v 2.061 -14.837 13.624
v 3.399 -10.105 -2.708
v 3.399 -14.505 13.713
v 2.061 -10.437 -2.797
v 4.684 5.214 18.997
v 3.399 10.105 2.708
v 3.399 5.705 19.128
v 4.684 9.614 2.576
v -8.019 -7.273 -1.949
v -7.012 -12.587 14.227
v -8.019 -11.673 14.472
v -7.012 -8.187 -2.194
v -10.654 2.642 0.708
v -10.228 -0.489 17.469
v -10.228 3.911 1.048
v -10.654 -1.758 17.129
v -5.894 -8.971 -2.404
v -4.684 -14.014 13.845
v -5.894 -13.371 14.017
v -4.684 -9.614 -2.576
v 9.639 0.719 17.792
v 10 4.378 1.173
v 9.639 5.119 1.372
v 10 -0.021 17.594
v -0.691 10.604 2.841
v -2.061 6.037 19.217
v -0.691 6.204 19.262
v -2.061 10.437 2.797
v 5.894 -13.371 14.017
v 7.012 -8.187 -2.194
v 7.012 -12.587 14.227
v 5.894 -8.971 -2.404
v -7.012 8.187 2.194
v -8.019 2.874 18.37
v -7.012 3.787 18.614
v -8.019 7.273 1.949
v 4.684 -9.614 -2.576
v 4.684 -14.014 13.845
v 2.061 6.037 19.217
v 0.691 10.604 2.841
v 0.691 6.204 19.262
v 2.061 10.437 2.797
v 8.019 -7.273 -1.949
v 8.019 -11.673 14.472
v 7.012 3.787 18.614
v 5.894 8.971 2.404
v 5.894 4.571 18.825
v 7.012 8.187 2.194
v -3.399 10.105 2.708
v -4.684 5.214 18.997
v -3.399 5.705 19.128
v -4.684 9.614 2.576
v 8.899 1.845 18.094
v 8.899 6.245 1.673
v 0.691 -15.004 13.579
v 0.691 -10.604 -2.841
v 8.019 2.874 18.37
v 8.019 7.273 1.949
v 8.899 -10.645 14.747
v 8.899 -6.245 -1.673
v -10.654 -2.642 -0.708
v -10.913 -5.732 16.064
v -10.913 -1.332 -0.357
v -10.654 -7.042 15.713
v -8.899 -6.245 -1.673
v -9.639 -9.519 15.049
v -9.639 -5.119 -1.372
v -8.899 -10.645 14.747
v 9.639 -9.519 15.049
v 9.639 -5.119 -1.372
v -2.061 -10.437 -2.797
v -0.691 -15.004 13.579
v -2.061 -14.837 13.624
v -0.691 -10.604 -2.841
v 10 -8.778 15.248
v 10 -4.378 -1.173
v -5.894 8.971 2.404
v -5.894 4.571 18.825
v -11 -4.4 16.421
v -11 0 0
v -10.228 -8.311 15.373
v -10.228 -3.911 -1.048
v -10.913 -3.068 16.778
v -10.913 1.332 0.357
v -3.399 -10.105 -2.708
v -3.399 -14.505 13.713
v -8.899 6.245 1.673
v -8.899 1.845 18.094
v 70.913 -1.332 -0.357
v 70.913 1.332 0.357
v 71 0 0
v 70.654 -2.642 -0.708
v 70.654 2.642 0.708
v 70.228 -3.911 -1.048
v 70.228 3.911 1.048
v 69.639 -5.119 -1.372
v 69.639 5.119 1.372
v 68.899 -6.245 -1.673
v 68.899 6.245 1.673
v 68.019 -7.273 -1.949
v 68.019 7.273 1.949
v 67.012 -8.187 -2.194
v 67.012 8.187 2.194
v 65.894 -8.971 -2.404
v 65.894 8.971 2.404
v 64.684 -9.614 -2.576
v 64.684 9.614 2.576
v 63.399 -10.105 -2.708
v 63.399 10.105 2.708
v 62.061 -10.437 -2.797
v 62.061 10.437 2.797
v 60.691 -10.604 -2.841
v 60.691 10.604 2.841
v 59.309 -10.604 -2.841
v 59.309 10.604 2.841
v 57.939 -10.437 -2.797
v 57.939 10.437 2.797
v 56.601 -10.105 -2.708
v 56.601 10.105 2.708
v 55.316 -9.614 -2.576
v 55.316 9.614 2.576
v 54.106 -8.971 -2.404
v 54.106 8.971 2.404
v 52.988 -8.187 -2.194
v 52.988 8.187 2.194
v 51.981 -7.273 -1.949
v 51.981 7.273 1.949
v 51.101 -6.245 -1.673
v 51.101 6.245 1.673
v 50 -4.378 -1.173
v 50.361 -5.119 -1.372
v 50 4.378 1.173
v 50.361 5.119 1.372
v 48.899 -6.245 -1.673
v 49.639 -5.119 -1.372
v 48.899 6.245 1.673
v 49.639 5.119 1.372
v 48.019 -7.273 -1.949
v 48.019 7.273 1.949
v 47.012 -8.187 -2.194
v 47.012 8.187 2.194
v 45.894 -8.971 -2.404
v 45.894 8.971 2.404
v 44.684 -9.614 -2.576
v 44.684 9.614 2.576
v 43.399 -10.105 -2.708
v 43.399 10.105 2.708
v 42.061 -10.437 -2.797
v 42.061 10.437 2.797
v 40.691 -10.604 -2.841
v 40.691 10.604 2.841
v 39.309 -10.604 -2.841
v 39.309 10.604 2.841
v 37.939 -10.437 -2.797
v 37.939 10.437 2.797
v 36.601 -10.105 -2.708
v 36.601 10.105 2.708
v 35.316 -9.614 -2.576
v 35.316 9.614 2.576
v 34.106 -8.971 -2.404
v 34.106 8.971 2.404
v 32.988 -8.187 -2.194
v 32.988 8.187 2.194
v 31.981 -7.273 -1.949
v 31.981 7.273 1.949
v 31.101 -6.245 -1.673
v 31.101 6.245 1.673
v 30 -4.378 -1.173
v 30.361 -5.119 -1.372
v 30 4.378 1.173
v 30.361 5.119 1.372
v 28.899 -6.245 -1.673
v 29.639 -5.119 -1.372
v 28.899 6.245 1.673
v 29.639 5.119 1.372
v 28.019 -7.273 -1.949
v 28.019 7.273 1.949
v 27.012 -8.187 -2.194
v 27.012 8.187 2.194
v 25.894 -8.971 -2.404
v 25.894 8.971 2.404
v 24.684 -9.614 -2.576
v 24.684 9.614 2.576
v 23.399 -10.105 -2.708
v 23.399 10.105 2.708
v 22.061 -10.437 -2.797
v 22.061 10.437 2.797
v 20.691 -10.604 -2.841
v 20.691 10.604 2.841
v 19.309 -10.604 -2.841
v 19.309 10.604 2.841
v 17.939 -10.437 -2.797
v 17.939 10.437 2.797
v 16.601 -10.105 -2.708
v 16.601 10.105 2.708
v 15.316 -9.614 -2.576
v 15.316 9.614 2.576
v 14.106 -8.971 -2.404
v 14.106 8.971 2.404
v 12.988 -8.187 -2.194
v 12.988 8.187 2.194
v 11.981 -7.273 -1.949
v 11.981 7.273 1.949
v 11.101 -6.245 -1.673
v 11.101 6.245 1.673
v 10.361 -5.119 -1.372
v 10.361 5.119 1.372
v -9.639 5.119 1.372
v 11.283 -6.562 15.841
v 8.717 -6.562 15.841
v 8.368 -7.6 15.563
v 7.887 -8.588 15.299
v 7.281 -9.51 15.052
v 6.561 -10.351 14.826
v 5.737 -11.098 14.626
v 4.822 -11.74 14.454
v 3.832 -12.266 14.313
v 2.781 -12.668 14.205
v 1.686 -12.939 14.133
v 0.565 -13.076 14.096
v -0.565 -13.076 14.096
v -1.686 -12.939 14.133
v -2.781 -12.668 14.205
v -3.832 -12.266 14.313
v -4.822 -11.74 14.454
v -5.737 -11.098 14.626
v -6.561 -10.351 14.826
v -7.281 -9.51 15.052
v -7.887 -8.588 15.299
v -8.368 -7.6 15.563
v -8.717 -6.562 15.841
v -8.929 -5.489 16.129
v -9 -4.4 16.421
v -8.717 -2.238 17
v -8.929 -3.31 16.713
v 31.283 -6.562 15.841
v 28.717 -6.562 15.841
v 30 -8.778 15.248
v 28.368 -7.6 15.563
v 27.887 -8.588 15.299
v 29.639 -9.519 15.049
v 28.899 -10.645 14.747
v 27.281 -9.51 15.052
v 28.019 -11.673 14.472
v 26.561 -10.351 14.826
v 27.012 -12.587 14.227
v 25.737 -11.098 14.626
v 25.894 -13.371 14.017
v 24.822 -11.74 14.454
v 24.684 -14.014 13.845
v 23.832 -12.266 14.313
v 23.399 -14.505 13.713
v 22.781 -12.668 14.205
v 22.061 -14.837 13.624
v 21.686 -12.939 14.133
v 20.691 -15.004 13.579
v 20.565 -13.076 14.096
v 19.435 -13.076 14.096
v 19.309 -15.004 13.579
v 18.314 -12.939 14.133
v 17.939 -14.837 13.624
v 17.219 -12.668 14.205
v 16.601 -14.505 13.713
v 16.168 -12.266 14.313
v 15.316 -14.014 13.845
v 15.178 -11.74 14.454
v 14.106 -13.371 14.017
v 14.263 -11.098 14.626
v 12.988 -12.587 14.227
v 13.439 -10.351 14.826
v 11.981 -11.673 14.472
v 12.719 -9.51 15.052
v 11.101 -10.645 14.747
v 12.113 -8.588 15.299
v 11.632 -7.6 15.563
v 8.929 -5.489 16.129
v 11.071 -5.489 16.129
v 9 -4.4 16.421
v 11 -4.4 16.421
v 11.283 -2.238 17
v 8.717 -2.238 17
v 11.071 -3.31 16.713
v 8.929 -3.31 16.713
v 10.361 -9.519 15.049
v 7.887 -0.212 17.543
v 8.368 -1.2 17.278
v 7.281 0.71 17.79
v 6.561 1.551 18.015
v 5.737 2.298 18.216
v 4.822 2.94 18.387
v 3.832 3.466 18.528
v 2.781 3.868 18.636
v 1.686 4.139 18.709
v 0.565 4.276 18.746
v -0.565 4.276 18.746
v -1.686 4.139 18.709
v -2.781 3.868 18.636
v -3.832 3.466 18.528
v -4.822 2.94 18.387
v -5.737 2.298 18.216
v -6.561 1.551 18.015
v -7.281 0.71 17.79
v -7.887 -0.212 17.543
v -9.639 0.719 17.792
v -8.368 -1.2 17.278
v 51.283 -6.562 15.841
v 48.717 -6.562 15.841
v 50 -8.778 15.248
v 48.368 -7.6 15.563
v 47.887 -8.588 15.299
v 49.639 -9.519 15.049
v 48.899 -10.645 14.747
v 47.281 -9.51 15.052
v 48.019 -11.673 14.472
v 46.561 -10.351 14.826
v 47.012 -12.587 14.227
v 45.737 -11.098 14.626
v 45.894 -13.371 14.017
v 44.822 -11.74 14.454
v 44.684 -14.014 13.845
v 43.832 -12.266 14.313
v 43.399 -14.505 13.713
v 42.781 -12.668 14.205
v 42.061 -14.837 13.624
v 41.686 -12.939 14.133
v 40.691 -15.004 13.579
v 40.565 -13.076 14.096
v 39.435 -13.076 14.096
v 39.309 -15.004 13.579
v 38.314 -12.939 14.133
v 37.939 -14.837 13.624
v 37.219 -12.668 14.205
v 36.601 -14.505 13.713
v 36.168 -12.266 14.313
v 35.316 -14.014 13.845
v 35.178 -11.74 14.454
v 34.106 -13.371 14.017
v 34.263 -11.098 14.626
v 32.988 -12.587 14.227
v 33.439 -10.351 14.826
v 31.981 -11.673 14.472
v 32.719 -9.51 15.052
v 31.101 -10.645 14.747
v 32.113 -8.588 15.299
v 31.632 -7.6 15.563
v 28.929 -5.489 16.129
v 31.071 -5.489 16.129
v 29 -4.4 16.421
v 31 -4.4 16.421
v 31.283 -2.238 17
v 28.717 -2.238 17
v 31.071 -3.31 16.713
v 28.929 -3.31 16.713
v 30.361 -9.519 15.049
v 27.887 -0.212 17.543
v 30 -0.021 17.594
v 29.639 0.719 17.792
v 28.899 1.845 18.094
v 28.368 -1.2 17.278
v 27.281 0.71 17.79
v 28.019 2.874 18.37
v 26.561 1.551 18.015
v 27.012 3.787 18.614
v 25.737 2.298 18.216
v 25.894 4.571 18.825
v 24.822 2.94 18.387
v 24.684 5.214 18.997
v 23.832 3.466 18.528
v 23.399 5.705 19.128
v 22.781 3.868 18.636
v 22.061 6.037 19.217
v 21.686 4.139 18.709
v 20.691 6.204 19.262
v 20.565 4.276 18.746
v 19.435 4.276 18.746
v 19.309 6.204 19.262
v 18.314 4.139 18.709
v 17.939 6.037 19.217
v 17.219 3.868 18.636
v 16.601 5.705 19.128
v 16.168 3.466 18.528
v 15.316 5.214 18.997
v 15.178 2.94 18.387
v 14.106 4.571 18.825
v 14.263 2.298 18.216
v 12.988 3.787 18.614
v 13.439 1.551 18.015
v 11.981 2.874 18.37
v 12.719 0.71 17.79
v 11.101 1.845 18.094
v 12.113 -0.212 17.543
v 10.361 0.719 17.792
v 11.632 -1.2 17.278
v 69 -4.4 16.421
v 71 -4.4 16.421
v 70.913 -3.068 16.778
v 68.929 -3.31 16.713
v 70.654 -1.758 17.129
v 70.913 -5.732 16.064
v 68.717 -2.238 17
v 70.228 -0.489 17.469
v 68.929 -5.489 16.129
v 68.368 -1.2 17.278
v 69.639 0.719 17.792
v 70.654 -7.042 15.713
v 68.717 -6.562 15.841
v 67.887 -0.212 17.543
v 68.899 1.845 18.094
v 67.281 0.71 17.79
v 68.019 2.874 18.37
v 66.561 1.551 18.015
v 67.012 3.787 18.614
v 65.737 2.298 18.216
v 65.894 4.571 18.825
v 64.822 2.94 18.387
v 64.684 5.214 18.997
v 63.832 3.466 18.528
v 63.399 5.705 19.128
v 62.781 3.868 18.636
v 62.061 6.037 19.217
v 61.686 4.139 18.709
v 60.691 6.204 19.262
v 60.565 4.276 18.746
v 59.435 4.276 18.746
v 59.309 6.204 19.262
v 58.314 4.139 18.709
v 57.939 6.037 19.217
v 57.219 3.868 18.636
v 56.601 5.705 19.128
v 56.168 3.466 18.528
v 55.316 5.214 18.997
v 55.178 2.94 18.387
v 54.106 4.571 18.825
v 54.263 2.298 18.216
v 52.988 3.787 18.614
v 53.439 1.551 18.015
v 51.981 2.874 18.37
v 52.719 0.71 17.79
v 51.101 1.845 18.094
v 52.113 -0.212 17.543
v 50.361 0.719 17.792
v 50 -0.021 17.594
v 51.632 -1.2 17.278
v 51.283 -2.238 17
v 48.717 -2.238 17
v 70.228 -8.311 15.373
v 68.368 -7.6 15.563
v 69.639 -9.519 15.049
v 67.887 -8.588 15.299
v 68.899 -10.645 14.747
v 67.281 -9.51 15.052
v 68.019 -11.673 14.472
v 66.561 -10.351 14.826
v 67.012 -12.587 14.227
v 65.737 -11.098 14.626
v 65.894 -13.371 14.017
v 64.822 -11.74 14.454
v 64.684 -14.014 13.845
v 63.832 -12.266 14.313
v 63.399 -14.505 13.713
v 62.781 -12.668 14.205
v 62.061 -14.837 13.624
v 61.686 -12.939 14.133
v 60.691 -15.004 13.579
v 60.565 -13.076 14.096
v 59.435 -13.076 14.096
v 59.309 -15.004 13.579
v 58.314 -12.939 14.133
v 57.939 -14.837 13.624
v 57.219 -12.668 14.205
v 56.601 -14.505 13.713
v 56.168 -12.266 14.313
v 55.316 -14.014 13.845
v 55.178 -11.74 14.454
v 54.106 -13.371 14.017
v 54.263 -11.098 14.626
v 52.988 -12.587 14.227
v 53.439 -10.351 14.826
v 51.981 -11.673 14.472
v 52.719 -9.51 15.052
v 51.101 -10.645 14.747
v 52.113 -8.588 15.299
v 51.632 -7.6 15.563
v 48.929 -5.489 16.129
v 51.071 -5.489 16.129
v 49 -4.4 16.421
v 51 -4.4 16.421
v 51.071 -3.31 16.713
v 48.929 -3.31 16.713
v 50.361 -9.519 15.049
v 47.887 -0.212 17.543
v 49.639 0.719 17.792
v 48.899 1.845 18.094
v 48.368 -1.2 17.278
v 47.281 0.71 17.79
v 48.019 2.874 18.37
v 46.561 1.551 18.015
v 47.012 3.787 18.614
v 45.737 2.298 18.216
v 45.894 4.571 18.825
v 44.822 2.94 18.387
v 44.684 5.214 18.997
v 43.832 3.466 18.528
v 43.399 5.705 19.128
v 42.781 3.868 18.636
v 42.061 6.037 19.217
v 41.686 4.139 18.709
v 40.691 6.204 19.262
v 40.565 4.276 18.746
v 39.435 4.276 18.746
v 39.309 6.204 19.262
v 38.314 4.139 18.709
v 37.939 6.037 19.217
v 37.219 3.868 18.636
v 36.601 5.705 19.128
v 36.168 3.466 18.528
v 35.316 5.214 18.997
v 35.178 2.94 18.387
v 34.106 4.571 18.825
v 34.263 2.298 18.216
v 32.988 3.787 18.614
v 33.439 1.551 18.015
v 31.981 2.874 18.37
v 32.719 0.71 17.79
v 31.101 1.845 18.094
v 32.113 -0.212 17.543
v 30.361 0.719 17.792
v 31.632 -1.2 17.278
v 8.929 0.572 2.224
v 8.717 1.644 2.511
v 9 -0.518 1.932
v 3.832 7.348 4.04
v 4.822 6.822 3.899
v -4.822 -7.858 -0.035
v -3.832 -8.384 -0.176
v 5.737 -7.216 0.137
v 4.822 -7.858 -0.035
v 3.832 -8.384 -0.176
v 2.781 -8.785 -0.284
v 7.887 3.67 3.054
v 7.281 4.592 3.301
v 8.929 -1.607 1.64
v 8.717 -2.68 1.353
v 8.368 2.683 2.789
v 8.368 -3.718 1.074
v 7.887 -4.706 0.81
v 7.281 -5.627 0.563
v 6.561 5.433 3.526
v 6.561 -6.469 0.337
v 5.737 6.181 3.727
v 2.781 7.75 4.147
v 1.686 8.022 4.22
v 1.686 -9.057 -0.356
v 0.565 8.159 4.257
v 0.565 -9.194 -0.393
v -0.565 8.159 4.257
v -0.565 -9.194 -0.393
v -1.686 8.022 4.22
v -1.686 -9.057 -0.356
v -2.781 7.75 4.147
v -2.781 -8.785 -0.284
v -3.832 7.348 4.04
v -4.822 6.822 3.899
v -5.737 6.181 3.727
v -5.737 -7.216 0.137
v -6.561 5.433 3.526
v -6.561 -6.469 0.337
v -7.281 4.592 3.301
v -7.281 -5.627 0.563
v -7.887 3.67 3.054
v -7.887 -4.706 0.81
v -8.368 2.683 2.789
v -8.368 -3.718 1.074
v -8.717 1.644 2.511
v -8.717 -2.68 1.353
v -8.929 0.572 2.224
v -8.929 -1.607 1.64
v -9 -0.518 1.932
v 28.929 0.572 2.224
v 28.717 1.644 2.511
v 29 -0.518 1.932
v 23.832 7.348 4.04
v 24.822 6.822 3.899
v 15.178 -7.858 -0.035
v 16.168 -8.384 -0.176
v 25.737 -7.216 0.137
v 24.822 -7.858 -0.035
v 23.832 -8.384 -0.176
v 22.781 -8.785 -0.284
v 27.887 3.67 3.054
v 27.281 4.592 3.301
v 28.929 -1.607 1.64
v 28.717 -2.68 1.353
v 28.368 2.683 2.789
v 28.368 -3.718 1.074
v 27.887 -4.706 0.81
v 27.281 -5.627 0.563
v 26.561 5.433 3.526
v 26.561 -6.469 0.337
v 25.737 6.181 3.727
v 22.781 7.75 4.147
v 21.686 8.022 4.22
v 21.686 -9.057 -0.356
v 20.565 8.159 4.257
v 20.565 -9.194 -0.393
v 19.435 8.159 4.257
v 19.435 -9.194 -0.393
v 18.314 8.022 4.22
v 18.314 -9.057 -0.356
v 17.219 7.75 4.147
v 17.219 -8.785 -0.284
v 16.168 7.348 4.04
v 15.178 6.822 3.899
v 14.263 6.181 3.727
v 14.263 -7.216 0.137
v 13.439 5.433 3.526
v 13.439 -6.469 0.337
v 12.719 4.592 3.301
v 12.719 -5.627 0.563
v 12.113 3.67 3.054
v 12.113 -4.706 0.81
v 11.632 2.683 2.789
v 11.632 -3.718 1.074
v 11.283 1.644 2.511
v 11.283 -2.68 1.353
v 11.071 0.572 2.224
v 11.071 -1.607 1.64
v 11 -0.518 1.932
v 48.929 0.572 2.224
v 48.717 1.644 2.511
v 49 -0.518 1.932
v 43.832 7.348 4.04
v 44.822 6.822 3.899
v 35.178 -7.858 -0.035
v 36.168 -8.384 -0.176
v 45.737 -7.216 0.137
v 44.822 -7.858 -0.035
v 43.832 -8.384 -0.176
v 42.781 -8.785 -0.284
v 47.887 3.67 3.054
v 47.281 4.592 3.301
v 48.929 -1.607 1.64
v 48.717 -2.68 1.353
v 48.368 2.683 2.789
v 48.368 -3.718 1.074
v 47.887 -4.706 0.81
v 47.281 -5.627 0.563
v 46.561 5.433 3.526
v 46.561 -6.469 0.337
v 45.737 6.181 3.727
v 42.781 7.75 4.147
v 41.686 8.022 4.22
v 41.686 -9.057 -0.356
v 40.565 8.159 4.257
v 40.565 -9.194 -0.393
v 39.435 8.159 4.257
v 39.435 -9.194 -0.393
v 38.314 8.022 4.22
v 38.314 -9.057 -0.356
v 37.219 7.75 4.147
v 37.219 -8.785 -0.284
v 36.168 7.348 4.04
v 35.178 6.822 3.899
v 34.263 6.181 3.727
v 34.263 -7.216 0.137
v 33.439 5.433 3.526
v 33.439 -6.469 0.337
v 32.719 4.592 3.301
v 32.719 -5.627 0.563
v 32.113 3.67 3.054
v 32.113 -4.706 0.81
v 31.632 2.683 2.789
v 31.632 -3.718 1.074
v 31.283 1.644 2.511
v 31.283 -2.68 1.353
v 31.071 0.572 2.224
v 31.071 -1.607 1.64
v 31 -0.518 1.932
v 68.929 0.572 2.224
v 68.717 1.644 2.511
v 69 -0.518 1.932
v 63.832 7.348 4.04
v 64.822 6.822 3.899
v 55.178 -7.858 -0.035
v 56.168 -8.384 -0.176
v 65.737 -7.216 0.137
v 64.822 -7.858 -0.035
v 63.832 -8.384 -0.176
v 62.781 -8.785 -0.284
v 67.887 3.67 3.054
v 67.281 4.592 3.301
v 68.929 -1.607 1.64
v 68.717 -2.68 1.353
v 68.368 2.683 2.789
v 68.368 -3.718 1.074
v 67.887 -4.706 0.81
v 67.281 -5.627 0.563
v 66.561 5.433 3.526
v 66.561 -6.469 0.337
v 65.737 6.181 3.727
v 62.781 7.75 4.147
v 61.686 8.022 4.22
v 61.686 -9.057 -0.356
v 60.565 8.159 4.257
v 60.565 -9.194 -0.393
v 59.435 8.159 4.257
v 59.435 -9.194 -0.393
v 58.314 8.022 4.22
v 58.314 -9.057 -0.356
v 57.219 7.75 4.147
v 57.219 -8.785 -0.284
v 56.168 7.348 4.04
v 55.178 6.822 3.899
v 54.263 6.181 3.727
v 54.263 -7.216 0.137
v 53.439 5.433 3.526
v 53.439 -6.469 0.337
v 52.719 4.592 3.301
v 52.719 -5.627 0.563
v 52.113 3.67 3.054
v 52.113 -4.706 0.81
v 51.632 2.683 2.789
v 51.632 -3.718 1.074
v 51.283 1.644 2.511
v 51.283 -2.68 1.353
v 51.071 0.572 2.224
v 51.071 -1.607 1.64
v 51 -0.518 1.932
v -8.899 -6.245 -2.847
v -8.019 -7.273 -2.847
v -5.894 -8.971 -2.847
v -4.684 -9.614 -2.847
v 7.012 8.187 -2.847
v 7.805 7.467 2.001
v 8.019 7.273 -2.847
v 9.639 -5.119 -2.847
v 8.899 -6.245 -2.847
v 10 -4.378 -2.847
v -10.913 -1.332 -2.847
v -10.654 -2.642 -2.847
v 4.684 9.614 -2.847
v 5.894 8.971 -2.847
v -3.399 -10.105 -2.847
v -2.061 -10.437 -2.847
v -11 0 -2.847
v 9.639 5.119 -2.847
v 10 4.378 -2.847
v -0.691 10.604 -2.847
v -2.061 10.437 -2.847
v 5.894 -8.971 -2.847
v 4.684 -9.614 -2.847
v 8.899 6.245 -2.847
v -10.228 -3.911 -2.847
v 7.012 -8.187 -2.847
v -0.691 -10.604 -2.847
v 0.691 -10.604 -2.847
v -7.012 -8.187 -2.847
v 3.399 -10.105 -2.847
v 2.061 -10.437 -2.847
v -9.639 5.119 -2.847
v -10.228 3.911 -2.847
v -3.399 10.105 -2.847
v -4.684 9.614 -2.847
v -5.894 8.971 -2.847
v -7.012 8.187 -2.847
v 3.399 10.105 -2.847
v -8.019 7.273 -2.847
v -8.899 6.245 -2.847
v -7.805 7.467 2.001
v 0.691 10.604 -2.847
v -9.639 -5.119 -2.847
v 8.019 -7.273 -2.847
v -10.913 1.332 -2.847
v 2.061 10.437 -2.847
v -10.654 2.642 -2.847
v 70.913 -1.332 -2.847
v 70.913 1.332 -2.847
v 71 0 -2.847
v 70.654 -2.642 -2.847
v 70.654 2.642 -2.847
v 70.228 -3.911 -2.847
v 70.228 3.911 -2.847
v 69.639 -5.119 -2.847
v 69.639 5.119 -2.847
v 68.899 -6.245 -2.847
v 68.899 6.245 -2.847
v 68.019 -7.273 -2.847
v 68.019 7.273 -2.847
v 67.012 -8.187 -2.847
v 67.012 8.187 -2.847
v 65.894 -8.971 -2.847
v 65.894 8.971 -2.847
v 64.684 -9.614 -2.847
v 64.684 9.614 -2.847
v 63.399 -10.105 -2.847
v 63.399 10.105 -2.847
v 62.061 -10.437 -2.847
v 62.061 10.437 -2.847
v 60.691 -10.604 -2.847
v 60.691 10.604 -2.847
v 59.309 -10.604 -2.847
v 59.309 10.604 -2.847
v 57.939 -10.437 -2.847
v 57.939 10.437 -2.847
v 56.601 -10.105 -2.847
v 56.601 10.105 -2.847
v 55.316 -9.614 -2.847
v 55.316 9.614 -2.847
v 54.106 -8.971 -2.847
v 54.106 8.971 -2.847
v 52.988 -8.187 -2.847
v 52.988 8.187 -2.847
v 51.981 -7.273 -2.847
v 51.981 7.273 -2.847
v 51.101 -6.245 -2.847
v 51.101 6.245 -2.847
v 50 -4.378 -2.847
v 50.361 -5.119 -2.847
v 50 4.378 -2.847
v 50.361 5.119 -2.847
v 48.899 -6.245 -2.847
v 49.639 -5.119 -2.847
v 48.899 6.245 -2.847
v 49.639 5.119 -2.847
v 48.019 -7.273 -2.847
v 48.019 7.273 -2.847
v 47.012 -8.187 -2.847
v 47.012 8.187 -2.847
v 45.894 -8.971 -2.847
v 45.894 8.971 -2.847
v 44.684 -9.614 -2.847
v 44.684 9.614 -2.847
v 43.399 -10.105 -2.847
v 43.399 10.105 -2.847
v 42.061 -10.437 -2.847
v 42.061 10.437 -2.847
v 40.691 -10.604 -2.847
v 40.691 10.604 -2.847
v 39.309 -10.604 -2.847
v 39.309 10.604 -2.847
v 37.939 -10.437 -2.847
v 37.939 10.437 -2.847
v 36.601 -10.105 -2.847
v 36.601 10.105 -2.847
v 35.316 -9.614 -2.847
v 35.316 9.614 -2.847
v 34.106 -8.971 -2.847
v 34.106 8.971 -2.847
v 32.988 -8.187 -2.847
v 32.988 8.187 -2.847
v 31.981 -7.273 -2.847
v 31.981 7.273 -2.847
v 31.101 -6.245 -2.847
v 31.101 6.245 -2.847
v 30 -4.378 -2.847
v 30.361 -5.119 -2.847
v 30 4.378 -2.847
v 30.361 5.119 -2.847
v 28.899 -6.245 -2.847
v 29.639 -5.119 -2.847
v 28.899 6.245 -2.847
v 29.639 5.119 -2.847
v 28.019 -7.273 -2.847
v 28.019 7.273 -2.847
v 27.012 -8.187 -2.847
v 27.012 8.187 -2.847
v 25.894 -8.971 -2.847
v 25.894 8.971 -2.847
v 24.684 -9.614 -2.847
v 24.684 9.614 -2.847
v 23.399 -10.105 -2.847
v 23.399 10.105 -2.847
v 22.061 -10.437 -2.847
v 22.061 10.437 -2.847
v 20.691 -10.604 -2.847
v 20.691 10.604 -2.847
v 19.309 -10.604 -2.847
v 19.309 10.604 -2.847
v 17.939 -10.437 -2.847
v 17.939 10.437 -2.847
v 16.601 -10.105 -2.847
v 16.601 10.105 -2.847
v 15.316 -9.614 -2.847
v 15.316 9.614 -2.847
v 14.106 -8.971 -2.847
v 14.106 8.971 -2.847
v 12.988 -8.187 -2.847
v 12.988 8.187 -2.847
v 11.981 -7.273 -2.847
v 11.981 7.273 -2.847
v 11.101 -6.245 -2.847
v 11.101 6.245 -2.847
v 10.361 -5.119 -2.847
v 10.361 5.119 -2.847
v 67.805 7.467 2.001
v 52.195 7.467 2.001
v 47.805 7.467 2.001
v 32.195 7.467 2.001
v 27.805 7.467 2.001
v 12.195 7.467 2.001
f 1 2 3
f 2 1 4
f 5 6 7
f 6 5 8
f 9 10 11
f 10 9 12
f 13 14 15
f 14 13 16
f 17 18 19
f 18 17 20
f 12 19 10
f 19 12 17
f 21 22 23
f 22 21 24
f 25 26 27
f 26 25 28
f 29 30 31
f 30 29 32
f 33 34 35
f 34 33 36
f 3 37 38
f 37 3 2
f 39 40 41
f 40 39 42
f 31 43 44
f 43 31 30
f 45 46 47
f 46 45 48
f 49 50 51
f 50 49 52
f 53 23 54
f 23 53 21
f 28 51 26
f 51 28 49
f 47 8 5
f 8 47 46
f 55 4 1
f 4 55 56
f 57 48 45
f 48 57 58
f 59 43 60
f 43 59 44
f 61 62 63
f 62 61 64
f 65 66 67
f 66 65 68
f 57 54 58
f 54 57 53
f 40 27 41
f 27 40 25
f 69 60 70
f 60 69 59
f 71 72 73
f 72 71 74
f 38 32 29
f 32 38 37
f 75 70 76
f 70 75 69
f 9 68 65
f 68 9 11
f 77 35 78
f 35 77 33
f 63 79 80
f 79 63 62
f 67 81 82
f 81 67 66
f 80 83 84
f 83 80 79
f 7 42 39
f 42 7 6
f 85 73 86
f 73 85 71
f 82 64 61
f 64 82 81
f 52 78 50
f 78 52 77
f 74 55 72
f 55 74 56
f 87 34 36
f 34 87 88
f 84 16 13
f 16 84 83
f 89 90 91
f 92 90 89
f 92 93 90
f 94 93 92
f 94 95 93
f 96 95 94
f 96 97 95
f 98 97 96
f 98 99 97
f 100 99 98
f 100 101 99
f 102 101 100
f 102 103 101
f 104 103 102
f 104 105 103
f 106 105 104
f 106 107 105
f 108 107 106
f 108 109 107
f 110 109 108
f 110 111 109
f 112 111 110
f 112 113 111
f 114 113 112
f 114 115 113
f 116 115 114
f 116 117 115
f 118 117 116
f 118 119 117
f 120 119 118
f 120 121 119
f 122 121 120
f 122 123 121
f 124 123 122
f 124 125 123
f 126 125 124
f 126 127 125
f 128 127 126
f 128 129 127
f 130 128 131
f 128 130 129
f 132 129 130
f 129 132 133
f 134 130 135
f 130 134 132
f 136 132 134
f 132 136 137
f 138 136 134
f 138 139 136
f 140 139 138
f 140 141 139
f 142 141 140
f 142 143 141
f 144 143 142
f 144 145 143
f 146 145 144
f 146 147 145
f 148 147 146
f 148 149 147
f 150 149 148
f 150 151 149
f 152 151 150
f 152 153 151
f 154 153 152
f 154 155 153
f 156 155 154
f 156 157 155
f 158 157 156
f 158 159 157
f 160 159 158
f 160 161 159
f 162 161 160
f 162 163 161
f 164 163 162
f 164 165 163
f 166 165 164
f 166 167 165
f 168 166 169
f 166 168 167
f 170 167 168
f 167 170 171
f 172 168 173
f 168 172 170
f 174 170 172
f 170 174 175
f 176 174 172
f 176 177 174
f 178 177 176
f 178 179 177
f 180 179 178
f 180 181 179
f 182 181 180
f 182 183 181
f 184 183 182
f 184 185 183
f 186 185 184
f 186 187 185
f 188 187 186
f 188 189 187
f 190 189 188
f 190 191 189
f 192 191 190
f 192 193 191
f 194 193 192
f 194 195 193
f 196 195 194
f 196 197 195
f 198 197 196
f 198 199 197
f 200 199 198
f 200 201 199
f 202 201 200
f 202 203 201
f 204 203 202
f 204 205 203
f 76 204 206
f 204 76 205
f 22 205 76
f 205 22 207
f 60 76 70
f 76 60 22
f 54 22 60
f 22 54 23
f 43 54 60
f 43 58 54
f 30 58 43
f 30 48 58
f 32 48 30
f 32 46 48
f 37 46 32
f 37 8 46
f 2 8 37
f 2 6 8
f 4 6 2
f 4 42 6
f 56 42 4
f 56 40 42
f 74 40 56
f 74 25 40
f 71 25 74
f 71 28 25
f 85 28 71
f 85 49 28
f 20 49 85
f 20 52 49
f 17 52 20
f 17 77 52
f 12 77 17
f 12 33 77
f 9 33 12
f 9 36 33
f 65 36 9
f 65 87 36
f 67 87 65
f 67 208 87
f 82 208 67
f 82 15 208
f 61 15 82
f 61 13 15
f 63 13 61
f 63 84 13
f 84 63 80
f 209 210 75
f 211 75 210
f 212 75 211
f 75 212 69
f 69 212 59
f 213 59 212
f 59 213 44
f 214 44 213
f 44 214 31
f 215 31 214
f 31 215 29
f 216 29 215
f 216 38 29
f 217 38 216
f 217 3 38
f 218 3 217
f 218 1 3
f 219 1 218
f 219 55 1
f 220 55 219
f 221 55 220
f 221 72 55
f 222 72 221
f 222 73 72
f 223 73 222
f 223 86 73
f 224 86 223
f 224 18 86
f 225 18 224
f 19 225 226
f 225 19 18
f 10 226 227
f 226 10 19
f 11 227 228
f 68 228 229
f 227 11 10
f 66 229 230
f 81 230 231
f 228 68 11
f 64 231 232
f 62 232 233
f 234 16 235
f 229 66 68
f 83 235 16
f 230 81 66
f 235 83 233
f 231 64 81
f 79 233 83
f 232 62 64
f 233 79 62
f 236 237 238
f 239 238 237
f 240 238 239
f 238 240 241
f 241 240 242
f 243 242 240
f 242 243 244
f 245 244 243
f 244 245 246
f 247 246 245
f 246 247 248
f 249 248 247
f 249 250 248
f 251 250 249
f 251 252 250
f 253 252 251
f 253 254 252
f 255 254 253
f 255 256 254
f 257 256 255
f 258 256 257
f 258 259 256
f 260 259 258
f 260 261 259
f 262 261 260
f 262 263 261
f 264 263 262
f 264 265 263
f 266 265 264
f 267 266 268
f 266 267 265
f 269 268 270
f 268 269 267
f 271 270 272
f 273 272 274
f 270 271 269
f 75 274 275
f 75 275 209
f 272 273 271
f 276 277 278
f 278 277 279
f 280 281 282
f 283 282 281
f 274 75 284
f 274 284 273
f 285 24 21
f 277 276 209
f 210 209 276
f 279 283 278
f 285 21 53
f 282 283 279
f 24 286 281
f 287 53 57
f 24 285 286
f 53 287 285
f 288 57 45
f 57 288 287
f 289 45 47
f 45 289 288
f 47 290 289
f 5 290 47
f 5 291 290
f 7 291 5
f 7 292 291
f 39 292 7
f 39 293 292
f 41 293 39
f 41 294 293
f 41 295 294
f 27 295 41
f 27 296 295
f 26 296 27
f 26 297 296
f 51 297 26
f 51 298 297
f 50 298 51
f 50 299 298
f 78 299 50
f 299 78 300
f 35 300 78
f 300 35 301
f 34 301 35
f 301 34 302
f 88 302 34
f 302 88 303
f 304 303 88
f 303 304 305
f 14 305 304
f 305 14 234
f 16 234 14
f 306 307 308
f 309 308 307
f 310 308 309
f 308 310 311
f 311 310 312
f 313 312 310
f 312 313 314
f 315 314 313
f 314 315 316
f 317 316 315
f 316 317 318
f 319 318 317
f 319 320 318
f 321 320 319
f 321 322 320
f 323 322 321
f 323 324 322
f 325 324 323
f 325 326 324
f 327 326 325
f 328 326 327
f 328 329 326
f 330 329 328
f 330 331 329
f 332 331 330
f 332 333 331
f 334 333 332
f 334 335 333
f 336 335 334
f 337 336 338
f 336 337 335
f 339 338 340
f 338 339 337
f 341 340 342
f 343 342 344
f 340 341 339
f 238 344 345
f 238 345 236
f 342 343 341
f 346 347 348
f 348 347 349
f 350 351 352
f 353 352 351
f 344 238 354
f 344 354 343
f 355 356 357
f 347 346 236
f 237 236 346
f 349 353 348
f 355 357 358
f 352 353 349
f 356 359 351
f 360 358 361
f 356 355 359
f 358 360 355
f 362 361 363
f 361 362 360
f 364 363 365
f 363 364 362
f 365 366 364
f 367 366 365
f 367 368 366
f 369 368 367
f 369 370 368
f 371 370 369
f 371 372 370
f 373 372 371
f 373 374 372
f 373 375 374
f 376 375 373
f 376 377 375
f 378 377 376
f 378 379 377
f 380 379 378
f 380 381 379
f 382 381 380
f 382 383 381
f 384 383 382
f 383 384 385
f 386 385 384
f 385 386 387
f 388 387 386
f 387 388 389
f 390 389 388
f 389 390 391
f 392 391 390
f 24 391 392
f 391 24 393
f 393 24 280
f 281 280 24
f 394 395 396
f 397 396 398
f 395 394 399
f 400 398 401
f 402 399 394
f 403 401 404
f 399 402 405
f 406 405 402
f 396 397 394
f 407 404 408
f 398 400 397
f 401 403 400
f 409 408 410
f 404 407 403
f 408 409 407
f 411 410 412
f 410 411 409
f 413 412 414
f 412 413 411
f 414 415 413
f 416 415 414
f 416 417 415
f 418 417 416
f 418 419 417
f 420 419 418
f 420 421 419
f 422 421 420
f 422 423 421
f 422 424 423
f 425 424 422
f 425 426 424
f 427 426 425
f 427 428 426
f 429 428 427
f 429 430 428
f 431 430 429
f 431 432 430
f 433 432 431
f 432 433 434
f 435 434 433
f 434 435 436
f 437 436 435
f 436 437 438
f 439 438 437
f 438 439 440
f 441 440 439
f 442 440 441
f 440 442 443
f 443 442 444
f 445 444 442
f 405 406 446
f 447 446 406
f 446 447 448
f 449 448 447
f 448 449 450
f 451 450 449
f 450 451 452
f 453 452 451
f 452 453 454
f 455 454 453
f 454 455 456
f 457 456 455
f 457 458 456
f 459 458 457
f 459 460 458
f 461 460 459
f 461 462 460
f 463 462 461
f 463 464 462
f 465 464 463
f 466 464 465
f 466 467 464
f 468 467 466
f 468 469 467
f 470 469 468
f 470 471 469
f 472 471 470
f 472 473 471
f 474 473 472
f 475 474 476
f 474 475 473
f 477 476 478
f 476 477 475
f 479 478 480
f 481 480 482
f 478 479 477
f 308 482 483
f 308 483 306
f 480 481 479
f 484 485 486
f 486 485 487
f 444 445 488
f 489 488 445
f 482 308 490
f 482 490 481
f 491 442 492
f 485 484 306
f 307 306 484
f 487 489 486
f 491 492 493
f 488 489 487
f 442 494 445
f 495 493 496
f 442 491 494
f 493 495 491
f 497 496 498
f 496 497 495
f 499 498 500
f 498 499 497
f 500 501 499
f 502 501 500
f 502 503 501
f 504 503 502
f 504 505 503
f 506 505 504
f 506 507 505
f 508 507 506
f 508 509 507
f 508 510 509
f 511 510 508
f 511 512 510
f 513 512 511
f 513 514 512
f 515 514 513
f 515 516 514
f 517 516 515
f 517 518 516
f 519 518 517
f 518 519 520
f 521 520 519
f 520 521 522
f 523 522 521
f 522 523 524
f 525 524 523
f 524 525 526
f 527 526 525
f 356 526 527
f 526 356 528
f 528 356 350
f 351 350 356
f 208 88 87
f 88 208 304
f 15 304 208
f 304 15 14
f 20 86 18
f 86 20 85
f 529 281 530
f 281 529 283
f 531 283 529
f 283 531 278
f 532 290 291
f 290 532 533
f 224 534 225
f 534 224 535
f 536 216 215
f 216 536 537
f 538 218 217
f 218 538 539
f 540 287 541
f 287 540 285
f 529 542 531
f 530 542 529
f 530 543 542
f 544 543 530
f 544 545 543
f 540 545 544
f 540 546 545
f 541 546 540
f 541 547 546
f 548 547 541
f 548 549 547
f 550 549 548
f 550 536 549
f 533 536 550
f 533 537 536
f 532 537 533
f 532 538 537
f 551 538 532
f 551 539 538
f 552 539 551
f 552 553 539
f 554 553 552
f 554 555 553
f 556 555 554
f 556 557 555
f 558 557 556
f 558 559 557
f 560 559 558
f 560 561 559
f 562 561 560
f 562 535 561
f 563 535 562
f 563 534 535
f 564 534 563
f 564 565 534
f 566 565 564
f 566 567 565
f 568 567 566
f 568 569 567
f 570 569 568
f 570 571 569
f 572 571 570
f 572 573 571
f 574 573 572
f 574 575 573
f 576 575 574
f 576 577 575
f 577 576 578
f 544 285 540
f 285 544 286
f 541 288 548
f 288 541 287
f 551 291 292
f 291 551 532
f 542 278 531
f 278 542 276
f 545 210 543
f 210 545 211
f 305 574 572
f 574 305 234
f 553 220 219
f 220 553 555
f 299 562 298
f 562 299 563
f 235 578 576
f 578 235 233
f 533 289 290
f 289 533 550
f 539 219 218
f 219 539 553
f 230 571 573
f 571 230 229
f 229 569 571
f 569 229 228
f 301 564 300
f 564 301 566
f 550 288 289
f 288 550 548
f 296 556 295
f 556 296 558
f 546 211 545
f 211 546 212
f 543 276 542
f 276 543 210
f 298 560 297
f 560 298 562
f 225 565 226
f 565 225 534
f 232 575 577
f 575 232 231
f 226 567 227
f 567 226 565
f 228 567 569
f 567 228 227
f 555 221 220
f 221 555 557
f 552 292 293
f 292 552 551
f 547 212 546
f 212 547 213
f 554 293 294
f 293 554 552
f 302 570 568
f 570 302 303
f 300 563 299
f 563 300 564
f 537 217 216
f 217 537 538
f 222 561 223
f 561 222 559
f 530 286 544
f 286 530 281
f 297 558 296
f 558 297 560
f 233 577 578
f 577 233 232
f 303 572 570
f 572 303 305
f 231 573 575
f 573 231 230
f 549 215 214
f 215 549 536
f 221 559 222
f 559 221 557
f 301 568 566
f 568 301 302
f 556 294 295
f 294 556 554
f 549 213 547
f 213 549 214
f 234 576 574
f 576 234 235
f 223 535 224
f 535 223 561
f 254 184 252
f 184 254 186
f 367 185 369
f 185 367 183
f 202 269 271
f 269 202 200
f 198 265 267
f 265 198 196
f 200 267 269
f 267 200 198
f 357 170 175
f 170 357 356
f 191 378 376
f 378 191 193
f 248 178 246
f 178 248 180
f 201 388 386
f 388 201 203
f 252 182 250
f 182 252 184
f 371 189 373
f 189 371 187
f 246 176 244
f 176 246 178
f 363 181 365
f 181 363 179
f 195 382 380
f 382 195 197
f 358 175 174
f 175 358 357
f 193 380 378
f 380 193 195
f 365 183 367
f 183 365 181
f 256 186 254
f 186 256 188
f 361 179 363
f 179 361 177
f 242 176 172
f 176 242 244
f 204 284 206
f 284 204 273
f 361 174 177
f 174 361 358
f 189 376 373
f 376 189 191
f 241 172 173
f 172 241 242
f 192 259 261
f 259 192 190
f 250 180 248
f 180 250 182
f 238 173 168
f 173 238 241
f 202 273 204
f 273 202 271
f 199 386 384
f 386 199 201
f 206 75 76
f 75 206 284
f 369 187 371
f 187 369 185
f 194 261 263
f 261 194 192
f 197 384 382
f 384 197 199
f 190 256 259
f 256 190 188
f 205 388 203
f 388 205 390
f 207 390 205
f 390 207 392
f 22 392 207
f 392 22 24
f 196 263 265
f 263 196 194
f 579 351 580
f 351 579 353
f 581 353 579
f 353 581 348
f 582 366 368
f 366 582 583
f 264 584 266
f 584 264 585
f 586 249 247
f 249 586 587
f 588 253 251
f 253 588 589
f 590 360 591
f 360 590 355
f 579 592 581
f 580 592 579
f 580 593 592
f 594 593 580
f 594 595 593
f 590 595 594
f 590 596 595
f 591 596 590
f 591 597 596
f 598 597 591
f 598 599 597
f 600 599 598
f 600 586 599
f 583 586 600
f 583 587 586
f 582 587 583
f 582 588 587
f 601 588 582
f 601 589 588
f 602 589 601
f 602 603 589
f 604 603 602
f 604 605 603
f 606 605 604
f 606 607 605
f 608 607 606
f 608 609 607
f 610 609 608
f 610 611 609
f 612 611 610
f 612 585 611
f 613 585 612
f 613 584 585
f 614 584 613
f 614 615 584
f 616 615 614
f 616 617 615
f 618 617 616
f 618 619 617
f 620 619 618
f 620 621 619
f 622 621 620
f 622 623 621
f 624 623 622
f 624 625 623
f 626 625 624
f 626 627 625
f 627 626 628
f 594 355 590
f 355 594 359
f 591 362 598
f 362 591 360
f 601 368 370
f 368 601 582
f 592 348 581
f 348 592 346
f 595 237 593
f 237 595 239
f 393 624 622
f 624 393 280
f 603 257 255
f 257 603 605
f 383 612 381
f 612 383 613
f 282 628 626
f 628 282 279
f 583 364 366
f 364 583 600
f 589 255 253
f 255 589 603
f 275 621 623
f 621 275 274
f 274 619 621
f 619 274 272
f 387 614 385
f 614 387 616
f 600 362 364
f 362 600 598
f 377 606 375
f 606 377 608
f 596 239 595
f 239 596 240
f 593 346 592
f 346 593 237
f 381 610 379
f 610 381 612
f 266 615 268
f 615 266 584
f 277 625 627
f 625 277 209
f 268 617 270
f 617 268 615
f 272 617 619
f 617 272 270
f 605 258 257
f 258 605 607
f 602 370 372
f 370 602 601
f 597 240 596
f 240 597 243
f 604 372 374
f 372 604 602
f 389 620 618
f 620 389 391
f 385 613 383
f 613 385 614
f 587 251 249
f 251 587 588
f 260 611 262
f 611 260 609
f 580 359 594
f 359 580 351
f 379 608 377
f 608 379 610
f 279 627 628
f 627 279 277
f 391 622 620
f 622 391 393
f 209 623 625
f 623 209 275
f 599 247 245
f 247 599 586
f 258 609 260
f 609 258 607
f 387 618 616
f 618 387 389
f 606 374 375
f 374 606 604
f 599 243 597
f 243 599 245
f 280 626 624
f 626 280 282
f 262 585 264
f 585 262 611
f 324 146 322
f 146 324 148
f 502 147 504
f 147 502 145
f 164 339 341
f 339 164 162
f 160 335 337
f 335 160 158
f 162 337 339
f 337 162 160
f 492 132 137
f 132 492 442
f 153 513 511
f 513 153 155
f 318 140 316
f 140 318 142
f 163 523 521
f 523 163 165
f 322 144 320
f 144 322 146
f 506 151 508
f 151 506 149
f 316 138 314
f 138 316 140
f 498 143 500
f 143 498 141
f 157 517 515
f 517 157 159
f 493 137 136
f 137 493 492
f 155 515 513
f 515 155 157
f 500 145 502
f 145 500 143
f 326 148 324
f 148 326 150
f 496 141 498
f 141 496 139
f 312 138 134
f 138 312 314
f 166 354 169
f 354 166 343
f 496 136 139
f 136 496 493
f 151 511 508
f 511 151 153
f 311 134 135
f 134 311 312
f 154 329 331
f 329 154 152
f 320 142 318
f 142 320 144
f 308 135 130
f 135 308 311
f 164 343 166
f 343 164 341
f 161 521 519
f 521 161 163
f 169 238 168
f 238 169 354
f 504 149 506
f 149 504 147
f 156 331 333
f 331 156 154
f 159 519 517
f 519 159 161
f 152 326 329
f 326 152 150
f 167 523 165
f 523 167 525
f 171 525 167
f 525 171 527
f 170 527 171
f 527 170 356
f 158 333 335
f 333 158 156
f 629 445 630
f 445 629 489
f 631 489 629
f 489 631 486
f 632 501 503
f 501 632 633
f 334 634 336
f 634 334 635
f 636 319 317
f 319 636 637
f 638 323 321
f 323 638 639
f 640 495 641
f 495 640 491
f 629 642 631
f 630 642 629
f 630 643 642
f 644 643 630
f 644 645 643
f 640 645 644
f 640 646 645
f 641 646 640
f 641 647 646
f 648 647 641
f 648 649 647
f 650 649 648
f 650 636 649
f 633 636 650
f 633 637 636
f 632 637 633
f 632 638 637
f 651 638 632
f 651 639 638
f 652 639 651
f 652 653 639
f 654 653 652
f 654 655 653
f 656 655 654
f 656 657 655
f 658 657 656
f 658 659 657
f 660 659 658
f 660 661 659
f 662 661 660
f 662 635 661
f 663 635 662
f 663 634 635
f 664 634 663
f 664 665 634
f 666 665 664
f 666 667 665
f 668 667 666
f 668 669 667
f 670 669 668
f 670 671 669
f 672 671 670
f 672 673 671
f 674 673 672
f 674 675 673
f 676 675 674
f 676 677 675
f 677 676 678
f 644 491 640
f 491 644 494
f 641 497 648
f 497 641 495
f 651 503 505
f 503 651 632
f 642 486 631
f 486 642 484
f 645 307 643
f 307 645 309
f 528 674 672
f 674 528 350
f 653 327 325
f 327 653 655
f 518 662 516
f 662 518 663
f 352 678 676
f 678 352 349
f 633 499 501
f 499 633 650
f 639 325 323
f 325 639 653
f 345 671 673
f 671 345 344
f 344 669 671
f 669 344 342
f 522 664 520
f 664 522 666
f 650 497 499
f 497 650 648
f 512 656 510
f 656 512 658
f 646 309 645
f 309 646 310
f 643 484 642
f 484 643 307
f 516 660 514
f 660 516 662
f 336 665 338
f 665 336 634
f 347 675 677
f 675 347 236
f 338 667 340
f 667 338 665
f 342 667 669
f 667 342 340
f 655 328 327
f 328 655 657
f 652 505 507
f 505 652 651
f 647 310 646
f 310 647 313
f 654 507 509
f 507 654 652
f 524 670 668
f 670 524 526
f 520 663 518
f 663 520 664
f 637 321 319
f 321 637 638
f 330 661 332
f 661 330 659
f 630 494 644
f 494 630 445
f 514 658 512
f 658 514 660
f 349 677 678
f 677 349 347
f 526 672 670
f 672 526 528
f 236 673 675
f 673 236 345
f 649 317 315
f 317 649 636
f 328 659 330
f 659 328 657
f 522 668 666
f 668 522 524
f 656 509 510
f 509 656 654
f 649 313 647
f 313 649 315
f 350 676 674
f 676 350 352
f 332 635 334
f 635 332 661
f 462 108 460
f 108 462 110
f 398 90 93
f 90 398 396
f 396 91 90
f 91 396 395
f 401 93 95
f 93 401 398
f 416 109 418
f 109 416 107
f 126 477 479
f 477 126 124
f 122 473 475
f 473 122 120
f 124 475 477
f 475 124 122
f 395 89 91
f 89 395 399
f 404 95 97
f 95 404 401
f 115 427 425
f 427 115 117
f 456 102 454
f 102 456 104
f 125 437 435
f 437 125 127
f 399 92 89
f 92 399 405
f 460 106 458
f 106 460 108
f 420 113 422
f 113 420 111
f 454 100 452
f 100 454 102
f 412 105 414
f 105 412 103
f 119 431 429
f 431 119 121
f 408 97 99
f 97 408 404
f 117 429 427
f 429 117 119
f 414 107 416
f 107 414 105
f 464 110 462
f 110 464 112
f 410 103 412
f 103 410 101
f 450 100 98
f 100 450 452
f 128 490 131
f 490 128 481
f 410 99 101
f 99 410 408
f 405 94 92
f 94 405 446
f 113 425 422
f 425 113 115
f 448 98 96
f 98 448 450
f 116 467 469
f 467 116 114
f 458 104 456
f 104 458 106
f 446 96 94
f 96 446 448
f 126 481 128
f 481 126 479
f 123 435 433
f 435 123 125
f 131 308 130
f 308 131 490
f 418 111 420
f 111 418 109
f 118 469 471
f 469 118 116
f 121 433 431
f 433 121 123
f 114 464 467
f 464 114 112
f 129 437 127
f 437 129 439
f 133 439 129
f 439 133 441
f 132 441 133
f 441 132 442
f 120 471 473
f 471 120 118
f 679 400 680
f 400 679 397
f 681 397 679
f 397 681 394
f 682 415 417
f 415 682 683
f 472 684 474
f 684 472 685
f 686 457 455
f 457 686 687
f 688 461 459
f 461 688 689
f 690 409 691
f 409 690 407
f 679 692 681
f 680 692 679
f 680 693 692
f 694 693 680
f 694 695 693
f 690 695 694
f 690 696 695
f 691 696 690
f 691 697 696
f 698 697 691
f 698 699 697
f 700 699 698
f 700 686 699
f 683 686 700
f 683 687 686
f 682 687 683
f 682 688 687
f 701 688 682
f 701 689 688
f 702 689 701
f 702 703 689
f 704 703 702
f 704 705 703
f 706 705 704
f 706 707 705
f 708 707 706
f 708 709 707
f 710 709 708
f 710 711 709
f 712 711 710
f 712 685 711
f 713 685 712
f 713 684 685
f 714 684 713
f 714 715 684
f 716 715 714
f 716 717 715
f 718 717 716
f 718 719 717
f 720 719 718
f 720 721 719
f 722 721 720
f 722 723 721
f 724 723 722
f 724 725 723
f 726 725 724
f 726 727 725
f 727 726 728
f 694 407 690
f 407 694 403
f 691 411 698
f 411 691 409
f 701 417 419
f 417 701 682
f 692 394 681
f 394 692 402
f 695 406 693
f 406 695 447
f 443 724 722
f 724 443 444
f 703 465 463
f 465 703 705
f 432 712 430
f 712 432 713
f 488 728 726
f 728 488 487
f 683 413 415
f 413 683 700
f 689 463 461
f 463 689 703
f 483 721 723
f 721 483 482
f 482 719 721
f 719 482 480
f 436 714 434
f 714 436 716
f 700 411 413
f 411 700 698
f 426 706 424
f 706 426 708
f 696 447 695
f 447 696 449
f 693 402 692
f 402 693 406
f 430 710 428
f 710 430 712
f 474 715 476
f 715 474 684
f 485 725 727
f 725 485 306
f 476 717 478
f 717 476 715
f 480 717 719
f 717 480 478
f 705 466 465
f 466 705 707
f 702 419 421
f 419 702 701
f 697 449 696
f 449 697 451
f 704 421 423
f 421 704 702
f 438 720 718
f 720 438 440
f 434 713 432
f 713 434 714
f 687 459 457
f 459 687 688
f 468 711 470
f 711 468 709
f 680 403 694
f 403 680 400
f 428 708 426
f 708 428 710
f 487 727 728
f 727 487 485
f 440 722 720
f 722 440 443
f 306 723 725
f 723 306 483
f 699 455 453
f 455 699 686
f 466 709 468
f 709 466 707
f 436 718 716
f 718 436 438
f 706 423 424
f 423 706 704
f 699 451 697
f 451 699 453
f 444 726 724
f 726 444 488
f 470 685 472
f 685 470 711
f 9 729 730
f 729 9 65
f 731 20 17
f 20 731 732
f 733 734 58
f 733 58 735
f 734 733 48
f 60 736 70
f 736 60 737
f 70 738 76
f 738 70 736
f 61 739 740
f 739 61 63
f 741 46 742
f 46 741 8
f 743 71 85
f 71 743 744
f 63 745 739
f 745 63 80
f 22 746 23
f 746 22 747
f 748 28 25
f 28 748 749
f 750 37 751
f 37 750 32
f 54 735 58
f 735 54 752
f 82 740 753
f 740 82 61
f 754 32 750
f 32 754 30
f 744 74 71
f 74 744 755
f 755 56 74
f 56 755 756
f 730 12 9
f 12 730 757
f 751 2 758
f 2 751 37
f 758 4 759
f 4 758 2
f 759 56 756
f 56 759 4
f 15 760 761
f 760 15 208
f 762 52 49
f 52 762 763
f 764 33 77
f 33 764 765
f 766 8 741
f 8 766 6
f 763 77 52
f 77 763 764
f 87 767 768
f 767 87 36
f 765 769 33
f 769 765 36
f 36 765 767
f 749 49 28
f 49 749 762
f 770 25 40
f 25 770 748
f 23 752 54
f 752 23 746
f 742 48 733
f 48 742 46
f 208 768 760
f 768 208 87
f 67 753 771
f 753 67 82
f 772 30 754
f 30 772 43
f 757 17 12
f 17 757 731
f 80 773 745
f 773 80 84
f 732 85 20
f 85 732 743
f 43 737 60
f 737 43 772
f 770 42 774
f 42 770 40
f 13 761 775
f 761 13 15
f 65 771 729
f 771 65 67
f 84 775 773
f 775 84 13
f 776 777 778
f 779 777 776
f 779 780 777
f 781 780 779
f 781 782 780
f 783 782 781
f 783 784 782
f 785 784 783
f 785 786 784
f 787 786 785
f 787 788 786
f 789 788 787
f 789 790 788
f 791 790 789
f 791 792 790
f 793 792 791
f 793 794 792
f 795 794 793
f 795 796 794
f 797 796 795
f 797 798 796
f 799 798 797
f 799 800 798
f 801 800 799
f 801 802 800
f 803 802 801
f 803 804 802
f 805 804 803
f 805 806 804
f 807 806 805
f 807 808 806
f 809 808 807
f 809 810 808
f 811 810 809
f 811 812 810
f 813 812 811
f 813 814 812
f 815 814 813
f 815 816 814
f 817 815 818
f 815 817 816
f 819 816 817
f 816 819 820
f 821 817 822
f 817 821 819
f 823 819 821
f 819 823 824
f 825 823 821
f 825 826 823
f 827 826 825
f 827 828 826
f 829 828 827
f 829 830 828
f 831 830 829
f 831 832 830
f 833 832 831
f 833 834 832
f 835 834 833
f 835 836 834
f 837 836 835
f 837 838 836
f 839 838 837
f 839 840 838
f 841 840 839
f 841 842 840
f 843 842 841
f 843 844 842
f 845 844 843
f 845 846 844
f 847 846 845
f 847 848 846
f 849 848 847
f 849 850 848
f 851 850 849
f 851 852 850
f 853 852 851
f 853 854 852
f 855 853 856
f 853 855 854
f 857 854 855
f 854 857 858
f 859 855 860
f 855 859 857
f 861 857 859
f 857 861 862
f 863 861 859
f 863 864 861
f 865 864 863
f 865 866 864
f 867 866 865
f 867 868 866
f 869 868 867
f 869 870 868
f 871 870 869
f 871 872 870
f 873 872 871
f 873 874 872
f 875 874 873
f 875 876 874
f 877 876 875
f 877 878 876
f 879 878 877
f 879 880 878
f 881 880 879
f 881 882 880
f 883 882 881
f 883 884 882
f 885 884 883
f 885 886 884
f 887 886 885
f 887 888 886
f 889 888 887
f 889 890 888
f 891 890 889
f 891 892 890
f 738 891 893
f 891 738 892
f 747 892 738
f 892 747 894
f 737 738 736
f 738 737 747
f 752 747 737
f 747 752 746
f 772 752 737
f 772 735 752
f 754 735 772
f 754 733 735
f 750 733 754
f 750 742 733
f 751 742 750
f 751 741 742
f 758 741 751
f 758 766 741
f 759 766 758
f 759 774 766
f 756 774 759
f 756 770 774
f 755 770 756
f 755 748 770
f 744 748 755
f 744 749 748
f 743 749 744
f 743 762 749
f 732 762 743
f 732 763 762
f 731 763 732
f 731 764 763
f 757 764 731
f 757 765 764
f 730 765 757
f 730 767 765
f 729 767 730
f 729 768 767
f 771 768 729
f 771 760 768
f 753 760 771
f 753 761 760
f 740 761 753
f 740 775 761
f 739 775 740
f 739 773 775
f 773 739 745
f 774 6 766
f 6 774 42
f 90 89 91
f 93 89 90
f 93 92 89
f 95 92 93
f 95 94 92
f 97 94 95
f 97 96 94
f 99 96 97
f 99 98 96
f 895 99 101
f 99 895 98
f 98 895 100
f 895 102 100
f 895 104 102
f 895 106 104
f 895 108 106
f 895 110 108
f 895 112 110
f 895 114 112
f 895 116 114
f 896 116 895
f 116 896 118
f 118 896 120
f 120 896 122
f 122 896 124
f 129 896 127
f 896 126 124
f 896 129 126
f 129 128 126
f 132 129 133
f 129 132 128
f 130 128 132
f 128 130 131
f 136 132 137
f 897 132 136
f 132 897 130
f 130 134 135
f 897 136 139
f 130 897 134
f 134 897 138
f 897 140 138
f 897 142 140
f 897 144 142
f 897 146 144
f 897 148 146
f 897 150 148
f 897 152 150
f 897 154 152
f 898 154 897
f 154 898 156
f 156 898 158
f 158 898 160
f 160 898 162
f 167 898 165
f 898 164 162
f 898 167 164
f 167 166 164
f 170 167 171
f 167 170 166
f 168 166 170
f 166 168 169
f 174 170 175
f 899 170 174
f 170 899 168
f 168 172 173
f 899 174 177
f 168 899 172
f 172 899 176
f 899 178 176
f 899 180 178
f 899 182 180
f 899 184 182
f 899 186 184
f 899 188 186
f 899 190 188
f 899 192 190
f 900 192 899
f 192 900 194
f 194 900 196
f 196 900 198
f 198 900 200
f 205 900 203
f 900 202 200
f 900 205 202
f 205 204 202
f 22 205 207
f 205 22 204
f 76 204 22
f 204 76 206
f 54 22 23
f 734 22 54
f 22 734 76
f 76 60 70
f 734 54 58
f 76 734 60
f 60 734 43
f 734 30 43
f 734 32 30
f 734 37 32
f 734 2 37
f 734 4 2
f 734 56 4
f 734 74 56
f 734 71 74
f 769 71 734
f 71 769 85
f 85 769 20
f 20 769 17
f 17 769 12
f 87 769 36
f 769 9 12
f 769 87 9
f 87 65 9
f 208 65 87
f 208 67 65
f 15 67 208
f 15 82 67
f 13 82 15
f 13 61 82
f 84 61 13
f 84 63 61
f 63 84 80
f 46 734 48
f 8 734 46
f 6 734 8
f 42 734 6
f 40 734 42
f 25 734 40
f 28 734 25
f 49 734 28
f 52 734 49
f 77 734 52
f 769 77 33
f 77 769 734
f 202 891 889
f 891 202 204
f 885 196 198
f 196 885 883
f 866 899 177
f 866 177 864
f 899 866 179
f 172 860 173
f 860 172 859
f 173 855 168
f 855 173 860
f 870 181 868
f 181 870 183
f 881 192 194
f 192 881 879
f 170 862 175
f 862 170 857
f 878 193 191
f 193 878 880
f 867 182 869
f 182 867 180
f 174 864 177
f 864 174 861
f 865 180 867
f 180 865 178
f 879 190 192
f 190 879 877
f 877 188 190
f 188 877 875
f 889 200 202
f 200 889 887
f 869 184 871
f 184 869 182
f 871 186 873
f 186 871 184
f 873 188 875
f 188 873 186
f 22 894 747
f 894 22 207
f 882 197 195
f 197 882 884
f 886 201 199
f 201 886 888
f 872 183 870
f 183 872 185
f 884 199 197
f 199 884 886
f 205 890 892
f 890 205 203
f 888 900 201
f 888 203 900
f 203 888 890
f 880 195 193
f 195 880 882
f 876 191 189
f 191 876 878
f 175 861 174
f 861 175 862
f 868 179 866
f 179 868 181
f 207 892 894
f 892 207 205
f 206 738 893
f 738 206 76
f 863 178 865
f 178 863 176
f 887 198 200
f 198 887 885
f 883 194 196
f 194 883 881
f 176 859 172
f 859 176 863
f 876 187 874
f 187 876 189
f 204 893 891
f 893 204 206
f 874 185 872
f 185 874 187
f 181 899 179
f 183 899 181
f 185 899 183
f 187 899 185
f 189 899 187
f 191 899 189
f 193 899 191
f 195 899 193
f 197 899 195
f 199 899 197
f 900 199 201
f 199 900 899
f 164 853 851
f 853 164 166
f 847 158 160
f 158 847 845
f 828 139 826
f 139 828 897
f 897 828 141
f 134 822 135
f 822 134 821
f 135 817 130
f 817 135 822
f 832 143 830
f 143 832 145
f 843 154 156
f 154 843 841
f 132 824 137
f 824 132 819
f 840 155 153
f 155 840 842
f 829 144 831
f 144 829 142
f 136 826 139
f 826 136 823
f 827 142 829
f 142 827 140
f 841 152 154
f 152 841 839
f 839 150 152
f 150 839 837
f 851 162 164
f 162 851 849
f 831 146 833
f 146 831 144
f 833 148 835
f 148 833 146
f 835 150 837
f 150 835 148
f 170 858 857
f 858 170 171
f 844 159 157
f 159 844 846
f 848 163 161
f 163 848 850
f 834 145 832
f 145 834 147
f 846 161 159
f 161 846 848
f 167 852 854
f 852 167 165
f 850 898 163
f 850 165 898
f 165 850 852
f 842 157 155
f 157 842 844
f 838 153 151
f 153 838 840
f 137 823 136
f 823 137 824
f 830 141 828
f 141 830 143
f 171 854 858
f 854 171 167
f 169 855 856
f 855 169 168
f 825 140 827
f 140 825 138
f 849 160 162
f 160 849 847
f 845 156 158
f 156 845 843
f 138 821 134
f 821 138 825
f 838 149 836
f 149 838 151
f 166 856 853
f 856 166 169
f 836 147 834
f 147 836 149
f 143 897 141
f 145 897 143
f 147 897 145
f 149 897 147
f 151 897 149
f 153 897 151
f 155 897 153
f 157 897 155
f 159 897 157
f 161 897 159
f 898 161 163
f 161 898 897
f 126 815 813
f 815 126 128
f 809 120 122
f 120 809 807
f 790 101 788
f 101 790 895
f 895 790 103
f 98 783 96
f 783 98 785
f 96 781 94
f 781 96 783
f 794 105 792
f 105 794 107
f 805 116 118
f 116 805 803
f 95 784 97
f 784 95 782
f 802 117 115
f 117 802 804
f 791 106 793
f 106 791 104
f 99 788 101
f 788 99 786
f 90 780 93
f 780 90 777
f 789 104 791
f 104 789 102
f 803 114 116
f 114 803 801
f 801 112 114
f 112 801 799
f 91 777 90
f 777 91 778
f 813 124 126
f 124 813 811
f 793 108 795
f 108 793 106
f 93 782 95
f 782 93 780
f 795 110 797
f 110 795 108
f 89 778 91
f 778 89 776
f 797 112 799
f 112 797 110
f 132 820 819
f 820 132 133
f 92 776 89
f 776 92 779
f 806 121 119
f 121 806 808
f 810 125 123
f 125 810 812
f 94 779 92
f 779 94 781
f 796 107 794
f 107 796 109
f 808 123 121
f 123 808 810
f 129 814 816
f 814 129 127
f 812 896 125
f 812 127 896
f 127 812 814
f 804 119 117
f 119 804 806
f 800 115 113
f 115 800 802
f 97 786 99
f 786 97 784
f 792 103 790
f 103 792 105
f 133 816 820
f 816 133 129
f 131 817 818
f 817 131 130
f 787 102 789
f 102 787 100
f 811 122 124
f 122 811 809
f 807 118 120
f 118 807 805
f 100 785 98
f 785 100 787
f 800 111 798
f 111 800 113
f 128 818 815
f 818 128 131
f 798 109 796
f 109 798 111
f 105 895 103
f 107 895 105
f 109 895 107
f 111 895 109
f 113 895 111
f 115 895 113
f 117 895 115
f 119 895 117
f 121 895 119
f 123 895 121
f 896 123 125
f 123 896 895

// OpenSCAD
r = 9;
h = 15;
d = 20;

N = 4;

walls = 2;

angle = 15;

diag =  2 * ( r + walls ) * cos( angle );
diag_h =  2 * ( r + walls ) * sin( angle );

module holder() {
    rotate( angle, [ 1, 0, 0 ] )
        difference(){
            cylinder( d = 2 * ( r + walls ), h = h + walls, $fn = 50 );
            translate( [ 0, 0, walls ] )
                cylinder( d = 2 * r, h = h + walls, $fn = 50 );
        }
}
module holder_full() {
    rotate( angle, [ 1, 0, 0 ] )
        cylinder( d = 2 * ( r + walls + 10 ), h = 100, $fn = 50 );
}

for ( i = [ 0 : N - 1 ] ){
    translate( [ i * d, 0, 0 ] )
        holder();
}

for ( i = [ 0 : N - 1 ] ){
    translate( [ i * d, 0, 0 ] )
    difference(){
        translate( [ 0, 0, -diag_h / 2 ] )
        scale( [ 1, cos( angle ), 1 ] )
            cylinder( d = 2 * ( r + walls ), h = diag_h, $fn = 50 );
        holder_full();
    }
}
